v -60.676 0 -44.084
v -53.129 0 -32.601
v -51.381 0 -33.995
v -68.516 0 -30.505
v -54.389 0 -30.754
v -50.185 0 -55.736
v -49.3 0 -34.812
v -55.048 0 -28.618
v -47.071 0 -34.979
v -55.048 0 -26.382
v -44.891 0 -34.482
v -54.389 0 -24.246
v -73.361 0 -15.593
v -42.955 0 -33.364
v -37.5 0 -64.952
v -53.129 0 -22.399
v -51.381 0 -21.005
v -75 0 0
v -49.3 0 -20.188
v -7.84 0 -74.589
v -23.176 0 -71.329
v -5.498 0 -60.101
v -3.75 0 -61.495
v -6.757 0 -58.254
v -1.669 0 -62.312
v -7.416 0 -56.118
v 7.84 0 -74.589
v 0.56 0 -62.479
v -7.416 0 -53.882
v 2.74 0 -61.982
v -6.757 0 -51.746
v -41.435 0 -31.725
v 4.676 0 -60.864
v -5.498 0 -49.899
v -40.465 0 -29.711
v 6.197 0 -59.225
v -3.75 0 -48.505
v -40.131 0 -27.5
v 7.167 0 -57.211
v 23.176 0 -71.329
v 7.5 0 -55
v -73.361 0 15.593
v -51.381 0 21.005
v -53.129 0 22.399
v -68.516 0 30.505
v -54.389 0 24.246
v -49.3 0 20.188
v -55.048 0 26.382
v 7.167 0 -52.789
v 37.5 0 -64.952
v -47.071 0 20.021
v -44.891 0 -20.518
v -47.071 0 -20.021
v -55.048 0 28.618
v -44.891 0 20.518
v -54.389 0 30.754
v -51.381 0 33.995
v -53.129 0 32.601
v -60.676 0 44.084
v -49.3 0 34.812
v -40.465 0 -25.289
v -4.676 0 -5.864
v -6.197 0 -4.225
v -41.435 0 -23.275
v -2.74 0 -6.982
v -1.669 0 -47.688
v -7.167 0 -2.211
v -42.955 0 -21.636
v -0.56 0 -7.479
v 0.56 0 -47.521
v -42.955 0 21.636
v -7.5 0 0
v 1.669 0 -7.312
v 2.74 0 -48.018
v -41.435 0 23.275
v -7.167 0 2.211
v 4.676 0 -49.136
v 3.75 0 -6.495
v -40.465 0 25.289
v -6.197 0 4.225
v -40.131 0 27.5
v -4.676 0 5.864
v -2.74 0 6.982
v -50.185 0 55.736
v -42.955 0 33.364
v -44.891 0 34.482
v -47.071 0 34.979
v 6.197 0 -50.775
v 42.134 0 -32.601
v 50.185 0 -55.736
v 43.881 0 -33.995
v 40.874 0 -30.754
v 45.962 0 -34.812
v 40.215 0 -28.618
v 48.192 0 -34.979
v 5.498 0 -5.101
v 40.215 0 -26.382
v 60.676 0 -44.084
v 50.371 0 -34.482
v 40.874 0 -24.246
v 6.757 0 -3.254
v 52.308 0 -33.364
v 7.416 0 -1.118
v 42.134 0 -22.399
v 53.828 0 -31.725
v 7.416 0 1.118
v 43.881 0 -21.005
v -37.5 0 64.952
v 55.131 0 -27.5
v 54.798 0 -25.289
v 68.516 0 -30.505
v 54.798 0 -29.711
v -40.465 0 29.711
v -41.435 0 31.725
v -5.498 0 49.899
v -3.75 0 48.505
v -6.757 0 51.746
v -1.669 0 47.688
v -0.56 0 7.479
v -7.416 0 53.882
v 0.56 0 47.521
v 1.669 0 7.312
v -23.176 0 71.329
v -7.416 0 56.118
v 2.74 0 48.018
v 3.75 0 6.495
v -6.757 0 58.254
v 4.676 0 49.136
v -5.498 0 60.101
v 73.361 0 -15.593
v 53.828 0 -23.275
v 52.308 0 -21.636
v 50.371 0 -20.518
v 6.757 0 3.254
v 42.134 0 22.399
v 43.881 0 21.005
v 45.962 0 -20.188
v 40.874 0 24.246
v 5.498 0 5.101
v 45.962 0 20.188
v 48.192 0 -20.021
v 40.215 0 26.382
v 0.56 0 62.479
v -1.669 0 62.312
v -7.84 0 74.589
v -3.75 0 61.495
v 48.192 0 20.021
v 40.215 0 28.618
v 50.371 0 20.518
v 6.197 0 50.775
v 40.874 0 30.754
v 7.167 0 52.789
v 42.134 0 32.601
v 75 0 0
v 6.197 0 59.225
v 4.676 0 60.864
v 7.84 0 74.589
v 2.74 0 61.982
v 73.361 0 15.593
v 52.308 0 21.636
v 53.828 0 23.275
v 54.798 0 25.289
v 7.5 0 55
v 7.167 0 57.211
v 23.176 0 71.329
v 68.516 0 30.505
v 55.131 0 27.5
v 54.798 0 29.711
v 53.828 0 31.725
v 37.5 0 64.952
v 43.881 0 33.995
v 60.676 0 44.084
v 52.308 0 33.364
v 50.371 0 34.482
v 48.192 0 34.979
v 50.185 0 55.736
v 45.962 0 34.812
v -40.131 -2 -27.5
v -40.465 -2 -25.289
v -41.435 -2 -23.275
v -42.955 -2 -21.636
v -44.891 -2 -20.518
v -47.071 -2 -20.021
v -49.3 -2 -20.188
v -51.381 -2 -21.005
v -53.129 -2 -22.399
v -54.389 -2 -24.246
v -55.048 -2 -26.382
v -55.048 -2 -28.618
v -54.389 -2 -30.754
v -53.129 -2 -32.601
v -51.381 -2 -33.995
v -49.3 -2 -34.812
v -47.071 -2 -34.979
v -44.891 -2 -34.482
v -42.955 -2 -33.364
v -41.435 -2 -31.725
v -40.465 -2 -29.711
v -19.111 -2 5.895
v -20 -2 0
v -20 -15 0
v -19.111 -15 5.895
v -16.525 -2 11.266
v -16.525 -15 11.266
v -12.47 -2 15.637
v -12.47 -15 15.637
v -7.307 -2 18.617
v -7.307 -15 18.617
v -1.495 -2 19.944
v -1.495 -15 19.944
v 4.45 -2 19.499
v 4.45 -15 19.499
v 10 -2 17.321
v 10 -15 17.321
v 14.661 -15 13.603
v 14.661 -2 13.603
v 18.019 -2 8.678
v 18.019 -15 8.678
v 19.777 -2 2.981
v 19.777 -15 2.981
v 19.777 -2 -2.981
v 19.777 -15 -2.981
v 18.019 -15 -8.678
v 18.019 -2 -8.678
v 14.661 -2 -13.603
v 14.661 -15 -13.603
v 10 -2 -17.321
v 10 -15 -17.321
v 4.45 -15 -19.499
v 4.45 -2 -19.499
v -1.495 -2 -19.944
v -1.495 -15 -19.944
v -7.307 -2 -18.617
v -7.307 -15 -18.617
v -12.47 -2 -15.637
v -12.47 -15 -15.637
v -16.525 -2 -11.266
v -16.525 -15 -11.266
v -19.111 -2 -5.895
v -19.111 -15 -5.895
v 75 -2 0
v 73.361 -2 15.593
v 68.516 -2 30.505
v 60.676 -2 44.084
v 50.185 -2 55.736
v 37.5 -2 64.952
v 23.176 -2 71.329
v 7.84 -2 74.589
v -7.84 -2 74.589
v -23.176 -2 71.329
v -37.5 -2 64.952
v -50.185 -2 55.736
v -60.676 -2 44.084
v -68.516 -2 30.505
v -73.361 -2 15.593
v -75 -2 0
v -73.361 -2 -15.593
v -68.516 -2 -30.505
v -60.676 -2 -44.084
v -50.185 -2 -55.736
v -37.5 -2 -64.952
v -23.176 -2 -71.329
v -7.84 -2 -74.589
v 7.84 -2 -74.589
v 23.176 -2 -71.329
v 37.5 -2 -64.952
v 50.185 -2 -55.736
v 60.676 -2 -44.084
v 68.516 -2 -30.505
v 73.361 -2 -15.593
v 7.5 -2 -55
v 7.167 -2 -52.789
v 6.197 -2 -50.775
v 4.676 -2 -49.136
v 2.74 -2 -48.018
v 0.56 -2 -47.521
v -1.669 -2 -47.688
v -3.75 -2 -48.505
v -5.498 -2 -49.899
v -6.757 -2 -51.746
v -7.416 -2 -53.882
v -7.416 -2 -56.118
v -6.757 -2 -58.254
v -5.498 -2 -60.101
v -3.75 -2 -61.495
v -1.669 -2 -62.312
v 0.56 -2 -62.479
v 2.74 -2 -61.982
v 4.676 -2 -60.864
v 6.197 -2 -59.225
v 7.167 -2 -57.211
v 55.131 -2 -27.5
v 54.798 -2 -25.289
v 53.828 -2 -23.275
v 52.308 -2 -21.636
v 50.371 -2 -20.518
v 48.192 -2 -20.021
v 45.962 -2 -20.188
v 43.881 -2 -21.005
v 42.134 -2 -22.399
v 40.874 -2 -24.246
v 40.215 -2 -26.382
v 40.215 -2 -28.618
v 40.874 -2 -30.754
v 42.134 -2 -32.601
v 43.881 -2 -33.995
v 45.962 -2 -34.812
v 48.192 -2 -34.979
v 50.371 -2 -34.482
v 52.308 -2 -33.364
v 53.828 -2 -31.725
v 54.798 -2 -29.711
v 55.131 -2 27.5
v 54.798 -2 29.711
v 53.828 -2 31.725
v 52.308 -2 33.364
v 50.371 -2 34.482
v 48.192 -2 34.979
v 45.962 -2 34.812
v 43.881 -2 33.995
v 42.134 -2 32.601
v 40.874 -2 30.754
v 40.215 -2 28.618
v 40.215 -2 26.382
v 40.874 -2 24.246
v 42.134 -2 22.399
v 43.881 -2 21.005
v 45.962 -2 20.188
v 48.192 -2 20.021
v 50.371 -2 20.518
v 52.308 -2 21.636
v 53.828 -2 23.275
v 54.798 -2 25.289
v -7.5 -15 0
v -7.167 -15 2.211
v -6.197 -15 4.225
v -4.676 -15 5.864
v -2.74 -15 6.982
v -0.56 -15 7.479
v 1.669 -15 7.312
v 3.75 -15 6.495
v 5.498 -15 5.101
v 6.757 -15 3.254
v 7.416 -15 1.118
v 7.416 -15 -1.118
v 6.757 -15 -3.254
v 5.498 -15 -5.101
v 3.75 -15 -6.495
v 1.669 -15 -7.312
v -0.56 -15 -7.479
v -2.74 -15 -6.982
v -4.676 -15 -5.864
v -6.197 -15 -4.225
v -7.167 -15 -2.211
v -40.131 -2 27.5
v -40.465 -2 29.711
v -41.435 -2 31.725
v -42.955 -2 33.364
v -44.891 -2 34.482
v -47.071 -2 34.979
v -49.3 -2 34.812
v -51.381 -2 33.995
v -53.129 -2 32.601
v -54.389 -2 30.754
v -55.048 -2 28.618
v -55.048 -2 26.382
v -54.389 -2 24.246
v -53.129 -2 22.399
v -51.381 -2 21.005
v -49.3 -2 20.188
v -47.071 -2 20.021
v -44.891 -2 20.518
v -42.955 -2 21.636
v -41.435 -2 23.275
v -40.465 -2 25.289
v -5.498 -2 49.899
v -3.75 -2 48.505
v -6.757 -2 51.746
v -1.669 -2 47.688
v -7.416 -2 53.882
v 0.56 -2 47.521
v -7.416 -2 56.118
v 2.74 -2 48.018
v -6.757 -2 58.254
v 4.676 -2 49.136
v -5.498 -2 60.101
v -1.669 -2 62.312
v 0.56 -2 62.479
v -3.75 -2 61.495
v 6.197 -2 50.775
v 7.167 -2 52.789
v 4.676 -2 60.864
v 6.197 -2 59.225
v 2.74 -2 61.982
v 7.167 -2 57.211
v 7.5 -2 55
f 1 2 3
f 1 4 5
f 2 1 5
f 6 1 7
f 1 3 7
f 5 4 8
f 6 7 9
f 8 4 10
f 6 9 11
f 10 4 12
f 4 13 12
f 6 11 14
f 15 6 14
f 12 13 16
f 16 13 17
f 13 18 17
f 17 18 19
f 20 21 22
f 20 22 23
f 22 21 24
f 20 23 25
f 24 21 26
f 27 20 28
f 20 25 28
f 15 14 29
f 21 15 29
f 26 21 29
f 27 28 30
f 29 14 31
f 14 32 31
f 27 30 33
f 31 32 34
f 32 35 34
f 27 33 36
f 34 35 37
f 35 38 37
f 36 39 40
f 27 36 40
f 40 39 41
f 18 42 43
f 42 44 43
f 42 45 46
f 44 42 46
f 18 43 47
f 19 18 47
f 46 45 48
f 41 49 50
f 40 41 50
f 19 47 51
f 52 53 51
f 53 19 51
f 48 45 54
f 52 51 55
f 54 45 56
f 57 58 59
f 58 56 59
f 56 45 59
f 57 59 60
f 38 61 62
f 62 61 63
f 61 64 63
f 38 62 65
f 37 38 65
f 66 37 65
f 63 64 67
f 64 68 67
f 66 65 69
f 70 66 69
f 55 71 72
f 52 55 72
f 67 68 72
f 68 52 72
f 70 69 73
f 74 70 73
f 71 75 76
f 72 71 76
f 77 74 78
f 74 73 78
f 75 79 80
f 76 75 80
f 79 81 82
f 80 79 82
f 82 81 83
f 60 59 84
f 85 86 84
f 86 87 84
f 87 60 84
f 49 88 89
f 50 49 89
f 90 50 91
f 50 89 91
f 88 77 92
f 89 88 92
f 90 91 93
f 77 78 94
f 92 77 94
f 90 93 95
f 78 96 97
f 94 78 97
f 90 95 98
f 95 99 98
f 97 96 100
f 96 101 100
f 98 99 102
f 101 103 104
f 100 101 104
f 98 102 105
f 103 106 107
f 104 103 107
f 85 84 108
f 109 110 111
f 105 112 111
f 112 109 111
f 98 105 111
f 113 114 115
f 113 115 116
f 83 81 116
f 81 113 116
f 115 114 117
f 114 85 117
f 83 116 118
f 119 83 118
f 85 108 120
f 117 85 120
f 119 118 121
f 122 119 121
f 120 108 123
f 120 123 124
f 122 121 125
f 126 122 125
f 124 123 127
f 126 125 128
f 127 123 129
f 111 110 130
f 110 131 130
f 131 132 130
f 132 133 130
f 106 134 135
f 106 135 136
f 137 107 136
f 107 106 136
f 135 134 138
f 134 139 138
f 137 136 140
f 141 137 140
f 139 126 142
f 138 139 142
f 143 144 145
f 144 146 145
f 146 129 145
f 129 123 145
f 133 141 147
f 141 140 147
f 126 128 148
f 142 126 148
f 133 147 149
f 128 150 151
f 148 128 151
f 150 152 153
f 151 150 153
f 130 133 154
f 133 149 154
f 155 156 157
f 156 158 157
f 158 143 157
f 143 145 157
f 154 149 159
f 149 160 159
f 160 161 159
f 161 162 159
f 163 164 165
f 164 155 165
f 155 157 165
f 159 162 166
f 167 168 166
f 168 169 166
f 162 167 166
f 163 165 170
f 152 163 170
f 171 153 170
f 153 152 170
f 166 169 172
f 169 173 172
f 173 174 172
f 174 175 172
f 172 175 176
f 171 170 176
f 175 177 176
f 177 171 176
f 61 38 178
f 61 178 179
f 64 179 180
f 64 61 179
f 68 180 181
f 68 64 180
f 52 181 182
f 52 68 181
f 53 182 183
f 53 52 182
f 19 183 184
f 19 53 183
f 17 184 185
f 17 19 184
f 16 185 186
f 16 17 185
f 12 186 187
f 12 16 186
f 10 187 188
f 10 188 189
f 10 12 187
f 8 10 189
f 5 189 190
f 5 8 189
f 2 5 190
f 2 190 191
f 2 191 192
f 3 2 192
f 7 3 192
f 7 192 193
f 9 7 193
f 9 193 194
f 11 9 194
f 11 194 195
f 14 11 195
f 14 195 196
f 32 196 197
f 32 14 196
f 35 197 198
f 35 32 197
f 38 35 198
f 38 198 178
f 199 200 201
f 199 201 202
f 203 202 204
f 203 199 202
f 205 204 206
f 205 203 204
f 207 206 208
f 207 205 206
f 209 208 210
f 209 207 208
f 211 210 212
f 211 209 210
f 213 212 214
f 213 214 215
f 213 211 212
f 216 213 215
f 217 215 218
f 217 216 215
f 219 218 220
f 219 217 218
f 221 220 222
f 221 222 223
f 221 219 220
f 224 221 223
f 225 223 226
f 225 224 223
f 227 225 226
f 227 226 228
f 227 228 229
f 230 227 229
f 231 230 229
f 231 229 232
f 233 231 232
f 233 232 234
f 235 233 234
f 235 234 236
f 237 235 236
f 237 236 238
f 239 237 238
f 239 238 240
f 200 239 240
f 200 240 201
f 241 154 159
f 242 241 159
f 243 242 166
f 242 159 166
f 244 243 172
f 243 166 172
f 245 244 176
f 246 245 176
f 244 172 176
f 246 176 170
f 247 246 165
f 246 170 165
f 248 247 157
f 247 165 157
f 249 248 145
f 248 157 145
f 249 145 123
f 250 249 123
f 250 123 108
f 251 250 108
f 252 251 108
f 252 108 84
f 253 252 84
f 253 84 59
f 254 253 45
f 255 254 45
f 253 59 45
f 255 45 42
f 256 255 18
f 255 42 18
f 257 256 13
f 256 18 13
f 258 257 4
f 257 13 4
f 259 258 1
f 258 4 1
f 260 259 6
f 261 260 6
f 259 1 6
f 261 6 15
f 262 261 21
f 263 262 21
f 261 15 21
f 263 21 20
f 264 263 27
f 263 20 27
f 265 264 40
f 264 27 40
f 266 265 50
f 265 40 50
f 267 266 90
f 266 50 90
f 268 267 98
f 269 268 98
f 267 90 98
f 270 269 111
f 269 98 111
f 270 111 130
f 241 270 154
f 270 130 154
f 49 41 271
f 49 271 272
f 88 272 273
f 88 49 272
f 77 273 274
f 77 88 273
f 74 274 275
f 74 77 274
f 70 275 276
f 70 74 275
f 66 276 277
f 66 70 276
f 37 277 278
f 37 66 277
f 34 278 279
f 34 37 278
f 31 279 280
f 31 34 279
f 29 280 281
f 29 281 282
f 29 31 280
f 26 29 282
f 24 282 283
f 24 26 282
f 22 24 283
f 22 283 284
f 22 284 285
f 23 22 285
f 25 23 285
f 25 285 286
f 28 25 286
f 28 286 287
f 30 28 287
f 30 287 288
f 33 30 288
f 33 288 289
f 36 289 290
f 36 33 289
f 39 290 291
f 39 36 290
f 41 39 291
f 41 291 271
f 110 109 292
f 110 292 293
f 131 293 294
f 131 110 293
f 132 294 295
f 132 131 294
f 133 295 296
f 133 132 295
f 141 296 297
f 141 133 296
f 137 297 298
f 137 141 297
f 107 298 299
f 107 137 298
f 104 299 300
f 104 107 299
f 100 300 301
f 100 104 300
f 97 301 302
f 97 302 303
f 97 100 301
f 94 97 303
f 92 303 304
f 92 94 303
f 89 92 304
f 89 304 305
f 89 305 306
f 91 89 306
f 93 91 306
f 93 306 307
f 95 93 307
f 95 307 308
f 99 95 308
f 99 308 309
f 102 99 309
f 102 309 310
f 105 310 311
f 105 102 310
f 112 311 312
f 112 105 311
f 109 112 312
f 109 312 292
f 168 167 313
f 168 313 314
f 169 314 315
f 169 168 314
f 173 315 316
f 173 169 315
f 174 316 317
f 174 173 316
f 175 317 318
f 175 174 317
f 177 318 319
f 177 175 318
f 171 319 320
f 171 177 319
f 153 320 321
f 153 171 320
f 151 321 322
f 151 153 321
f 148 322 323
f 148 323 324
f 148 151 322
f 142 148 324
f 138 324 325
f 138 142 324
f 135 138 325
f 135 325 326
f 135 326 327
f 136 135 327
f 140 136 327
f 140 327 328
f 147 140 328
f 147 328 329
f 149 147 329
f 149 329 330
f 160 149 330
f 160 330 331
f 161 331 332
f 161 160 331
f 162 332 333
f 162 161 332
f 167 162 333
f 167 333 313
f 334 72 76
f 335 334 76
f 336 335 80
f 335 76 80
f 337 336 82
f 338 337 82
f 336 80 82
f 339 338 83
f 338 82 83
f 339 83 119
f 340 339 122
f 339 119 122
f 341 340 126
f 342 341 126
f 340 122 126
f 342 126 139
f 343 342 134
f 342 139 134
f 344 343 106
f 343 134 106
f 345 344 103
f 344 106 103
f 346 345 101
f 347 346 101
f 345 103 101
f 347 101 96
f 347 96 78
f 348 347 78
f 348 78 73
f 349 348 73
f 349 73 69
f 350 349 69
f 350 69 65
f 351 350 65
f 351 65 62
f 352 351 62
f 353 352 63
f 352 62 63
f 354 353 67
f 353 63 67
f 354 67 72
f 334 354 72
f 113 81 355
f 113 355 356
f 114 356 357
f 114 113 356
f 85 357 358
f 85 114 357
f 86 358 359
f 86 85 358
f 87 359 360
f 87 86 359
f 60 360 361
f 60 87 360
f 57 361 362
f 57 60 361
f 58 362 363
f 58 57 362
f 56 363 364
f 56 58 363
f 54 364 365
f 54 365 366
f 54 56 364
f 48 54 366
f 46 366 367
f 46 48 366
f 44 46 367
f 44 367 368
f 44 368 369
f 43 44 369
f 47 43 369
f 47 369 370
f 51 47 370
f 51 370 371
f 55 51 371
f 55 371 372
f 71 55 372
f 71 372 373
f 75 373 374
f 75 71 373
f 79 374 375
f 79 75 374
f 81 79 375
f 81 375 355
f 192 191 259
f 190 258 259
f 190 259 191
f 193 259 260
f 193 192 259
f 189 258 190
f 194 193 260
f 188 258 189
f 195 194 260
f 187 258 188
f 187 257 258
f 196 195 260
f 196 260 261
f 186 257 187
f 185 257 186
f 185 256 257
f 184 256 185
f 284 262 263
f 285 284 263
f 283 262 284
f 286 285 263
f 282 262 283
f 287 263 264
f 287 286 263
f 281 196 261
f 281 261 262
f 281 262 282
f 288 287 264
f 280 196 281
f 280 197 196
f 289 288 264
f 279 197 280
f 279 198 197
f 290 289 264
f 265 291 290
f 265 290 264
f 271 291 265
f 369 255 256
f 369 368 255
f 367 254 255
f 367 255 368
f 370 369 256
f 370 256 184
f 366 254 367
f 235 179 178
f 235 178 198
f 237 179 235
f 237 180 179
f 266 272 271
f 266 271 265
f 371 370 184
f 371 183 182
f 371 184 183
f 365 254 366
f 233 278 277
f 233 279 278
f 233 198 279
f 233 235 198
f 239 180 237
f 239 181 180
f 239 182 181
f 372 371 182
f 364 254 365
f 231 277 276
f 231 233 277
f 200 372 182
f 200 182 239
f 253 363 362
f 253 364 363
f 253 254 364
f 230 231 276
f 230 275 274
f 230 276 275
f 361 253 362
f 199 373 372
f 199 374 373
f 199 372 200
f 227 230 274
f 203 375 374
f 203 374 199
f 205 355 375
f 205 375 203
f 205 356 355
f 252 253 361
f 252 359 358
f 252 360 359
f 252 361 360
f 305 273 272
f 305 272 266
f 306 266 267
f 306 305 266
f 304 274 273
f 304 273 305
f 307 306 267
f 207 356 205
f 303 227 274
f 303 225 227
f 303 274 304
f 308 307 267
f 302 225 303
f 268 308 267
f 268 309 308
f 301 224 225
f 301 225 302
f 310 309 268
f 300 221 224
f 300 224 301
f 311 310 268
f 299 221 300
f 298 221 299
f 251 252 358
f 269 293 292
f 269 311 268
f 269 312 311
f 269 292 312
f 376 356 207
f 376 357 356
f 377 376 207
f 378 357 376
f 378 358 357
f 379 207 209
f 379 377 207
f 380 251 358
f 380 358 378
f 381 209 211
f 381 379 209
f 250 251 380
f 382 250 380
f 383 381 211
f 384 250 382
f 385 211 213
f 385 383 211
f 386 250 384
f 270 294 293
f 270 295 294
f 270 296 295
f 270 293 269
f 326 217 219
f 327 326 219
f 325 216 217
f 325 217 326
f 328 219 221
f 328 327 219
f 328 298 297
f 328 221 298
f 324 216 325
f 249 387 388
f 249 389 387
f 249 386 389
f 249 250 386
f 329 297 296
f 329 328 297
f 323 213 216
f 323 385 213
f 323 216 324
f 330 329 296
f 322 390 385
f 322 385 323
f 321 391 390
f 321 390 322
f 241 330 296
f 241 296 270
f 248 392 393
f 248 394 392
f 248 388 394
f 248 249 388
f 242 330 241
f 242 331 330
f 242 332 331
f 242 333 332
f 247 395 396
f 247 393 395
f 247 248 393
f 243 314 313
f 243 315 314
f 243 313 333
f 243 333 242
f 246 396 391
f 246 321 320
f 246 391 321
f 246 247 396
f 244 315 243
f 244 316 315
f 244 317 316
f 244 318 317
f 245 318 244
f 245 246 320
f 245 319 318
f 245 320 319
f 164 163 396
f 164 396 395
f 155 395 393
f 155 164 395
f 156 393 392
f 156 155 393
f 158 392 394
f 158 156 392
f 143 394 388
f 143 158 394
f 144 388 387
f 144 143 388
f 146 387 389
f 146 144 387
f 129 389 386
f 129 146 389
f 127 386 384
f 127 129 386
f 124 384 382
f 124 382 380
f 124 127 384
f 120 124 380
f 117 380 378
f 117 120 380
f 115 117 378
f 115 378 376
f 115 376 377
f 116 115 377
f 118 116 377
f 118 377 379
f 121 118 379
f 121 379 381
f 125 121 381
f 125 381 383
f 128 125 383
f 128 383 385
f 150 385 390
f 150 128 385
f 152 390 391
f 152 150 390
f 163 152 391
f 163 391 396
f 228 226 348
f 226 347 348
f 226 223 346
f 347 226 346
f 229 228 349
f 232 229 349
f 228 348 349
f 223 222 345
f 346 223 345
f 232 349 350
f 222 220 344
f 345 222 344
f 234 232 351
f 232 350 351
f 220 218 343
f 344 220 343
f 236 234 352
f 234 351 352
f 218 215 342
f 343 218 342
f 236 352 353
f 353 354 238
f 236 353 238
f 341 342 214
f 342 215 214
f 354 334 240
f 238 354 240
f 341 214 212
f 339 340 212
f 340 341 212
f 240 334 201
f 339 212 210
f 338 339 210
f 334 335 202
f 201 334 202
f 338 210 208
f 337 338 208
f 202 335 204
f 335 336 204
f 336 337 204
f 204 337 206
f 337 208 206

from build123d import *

# Parameters (mm, degrees)
F0_R     = 75
F0_R_2   = 7.5
F0_R_3   = 20
F1_DEPTH = 2
F2_R     = 20
F2_R_2   = 7.5
F3_DEPTH = 15


with BuildPart() as f1:
    # F0 (on Front) → F1 (new body)
    with BuildSketch(Plane.XZ):
        Circle(F0_R)
        with Locations((-47.6313972081, -27.5)):
            Circle(F0_R_2, mode=Mode.SUBTRACT)
        with Locations((0, -55)):
            Circle(F0_R_2, mode=Mode.SUBTRACT)
        with Locations((47.6313972081, -27.5)):
            Circle(F0_R_2, mode=Mode.SUBTRACT)
        with Locations((-47.6313972081, 27.5)):
            Circle(F0_R_2, mode=Mode.SUBTRACT)
        Circle(F0_R_3, mode=Mode.SUBTRACT)
        with Locations((47.6313972081, 27.5)):
            Circle(F0_R_2, mode=Mode.SUBTRACT)
        with Locations((0, 55)):
            Circle(F0_R_2, mode=Mode.SUBTRACT)
    extrude(amount=F1_DEPTH)

    # F2 (on face) → F3 (join)
    with BuildSketch(Plane(origin=(0, 0, 0), x_dir=(-1, 0, 0), z_dir=(0, 1, 0))):
        Circle(F2_R)
        Circle(F2_R_2, mode=Mode.SUBTRACT)
    extrude(amount=-F3_DEPTH)


solid = f1.part
